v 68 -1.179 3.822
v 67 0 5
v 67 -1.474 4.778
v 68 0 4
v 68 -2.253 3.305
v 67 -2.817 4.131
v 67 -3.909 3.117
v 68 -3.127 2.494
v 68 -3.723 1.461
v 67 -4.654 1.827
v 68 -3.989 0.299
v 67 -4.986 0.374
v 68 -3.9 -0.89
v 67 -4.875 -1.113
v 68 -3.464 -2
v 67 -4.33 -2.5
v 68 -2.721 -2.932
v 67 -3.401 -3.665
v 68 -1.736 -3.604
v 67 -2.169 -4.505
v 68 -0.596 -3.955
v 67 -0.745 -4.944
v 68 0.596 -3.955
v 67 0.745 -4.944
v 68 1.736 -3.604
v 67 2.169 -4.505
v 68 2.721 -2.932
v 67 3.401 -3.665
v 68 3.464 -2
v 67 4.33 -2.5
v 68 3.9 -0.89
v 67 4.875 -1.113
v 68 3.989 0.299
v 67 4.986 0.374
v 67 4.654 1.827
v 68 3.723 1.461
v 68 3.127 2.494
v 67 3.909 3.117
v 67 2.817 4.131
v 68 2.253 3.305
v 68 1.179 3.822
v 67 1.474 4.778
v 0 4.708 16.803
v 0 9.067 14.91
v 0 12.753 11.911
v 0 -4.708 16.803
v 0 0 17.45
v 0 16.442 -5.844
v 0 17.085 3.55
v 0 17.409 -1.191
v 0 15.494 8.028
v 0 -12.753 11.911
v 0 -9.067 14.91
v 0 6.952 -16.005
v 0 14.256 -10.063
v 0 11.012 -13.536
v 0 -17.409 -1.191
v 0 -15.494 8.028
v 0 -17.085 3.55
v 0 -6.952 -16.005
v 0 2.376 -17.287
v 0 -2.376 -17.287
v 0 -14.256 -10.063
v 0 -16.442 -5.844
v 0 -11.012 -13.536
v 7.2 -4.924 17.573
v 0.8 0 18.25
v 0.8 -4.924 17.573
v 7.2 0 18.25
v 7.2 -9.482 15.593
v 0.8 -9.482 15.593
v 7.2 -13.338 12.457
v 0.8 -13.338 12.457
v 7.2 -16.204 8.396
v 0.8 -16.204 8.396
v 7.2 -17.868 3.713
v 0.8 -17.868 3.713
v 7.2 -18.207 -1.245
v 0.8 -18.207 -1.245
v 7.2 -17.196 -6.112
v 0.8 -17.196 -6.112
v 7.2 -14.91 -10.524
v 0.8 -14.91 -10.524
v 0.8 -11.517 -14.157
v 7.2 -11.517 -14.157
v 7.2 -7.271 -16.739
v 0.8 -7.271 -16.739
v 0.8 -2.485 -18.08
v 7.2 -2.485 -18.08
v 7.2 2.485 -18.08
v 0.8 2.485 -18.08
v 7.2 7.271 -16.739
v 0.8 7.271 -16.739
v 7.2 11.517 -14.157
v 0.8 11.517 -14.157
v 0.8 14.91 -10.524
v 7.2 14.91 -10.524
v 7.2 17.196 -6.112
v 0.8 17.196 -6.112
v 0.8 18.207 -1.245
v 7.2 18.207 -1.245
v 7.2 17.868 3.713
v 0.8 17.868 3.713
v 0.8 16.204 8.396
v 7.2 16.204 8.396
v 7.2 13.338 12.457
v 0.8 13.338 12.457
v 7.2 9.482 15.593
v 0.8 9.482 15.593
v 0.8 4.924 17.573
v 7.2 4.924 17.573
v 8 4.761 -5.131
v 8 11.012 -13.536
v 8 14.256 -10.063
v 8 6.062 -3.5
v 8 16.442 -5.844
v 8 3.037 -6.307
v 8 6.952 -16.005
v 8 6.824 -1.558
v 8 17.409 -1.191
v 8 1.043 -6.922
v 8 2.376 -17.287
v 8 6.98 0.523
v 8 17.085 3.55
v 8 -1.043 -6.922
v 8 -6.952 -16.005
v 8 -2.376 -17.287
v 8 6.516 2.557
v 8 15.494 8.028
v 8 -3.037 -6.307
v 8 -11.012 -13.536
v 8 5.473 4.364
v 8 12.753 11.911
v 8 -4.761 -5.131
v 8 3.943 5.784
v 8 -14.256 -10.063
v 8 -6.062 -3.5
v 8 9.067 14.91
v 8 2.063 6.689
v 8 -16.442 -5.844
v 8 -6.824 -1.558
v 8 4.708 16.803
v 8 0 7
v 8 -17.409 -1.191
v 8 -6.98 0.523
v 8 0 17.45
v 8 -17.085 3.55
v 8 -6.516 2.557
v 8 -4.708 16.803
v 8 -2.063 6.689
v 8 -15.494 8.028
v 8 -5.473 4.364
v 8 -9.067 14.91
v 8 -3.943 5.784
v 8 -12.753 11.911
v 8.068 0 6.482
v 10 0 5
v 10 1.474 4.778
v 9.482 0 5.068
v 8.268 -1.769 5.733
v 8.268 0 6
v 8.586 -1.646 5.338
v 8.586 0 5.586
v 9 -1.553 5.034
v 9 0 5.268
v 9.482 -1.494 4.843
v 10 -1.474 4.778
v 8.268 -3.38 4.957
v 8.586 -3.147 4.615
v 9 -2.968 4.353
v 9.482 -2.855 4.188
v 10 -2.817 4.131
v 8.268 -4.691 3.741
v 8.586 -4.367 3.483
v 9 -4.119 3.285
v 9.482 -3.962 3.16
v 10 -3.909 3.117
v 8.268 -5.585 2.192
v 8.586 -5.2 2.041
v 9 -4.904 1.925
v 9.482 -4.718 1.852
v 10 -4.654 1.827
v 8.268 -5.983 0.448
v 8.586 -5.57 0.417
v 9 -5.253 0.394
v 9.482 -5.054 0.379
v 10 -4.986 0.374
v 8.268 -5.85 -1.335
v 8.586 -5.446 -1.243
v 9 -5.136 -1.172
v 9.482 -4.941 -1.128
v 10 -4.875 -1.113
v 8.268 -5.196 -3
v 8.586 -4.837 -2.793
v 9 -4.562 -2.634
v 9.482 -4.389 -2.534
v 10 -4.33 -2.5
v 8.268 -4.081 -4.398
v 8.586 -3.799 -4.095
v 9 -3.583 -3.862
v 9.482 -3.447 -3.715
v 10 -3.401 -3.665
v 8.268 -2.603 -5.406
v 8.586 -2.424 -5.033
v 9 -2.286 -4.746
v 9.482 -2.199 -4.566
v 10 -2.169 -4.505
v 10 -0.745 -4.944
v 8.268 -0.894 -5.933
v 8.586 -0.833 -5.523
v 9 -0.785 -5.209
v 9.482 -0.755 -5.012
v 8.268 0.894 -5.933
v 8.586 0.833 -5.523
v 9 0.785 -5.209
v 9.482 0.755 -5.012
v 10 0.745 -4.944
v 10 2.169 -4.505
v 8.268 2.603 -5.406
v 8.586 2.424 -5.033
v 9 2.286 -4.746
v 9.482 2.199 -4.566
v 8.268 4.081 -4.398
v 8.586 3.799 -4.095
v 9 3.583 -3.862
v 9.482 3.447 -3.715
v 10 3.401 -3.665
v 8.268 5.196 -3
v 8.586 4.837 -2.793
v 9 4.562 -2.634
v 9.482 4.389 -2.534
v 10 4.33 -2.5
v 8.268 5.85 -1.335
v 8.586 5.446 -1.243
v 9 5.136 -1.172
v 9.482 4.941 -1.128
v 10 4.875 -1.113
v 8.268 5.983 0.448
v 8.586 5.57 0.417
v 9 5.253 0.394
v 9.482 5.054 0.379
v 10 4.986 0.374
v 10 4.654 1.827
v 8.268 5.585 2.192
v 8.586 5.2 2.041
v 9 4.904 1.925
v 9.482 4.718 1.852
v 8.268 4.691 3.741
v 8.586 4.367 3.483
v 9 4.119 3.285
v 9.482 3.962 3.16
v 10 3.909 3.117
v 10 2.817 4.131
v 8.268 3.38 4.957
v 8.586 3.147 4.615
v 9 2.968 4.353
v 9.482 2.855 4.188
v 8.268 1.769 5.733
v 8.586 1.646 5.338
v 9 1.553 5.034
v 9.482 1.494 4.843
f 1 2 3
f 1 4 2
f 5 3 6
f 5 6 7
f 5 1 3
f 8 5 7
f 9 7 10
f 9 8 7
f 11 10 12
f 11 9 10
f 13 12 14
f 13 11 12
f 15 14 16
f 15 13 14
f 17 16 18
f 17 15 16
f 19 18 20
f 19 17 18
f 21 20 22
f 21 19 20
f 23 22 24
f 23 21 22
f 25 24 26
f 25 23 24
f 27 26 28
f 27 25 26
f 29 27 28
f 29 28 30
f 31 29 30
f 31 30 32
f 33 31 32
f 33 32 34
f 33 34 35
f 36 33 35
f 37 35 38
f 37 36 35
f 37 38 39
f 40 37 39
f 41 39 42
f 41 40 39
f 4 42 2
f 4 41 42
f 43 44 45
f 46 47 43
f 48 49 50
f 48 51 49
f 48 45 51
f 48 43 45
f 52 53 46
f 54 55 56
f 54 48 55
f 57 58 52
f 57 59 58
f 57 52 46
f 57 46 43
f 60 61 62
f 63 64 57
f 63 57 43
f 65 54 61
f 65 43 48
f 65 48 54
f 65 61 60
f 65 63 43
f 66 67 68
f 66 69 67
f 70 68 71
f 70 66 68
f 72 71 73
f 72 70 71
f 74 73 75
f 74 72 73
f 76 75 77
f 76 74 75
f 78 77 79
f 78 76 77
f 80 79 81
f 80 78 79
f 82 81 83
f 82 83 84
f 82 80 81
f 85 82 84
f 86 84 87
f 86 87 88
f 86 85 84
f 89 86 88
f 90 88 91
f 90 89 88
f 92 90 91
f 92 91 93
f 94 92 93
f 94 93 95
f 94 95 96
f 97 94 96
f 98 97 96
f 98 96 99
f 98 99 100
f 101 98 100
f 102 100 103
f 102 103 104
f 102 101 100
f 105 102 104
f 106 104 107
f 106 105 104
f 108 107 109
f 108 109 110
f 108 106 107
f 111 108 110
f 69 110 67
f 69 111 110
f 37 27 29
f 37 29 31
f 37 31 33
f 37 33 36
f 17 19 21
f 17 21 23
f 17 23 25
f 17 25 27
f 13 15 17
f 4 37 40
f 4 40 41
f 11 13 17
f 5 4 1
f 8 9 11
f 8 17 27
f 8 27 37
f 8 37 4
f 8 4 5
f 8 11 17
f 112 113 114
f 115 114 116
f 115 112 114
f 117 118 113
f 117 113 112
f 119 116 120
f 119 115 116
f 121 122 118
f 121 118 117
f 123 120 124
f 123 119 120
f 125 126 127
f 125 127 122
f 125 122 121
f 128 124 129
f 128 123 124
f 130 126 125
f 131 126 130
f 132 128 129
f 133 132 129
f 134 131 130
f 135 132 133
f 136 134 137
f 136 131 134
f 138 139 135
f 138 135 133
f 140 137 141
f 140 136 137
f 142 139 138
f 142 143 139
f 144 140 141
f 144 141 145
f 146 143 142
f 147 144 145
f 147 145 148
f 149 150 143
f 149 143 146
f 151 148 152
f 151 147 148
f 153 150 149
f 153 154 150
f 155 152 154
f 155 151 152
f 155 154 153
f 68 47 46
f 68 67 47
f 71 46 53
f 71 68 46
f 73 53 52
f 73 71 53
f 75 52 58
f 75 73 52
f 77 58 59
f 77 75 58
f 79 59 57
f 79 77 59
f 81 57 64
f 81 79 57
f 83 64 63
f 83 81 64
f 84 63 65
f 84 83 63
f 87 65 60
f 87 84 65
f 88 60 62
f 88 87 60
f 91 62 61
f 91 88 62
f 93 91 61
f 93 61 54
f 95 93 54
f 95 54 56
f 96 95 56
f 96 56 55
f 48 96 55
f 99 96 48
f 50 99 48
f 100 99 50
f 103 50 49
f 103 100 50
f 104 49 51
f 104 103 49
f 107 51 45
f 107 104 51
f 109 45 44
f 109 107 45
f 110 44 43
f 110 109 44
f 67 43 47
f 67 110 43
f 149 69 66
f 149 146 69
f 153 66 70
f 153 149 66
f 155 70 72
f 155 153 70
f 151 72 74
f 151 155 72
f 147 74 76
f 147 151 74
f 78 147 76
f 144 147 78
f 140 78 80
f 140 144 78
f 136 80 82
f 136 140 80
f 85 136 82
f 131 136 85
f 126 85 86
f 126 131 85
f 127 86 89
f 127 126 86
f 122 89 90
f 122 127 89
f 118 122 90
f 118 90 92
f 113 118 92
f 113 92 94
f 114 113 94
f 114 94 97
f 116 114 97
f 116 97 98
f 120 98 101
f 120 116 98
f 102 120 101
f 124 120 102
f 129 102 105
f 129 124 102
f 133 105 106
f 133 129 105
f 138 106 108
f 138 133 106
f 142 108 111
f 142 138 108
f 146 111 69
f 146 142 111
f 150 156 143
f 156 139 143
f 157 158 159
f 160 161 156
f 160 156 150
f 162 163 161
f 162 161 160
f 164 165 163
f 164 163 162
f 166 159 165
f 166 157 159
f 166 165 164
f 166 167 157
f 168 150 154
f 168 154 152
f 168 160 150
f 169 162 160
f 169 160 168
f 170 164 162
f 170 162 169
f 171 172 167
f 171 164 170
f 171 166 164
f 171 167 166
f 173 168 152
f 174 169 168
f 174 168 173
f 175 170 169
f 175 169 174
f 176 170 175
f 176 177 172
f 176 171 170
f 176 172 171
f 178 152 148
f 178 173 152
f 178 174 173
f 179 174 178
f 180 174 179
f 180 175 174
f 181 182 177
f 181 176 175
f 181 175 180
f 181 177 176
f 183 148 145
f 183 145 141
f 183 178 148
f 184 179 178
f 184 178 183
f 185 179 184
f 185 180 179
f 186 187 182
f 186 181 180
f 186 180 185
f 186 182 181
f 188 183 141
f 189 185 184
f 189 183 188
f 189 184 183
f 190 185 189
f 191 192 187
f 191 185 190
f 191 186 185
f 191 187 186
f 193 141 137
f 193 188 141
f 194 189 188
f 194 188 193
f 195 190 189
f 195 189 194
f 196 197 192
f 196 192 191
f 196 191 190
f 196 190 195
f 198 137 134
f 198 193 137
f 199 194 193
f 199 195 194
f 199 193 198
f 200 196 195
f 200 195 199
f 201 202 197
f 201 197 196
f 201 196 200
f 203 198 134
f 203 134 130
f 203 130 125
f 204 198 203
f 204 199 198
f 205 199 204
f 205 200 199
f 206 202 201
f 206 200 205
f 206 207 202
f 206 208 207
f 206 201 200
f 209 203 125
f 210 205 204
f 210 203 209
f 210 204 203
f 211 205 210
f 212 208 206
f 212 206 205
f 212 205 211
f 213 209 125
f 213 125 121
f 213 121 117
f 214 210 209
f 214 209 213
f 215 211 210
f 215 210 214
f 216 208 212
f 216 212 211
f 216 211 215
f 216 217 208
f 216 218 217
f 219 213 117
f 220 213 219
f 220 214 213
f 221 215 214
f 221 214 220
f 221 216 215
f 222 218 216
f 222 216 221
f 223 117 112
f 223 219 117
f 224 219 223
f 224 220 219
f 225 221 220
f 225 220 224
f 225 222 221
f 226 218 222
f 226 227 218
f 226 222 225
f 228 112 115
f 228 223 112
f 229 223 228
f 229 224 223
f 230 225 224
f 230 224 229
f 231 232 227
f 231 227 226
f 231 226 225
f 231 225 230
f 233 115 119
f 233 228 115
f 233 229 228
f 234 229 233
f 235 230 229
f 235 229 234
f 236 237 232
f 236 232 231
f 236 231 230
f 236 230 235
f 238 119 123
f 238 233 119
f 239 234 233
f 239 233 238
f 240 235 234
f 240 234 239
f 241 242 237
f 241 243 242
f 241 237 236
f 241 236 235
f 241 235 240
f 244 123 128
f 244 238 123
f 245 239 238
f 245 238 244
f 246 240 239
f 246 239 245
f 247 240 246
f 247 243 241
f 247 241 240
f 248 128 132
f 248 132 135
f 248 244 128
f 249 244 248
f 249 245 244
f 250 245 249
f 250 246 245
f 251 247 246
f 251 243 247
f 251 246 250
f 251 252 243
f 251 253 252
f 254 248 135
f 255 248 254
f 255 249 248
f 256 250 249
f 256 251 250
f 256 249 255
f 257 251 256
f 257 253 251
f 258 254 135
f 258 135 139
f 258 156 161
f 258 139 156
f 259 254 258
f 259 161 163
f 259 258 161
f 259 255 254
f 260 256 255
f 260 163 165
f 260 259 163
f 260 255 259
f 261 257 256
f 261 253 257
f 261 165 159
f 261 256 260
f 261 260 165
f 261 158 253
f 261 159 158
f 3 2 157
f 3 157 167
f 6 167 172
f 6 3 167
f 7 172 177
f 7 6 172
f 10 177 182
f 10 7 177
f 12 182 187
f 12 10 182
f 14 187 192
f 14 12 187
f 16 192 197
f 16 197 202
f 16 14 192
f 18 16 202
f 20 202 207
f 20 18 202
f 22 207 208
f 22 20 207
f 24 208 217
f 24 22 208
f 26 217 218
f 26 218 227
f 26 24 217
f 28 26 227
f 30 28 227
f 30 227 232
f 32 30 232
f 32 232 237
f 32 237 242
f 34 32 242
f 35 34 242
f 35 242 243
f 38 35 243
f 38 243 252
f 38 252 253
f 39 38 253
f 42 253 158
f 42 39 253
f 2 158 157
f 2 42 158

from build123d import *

# Parameters (mm, degrees)
FILLET2_R     = 2
SKETCH1_R     = 0.5
NOTHING_DEPTH = 2


with BuildPart() as part:
    # BodySke → Base-Revolve (revolve)
    with BuildSketch(Plane.XY, mode=Mode.PRIVATE) as base_revolve_sk:
        Polygon((67, 5), (68, 4), (68, 0), (0, 0), (0, 17.45), (0.8, 18.25), (7.2, 18.25), (8, 17.45), (8, 5), align=None)
    revolve(base_revolve_sk.sketch.rotate(Axis((-11.400788802, 0, 0), (1, 0, 0)), 90), axis=Axis((-11.400788802, 0, 0), (1, 0, 0)))

    # Fillet2
    fillet2_edges = [part.edges().sort_by_distance(p)[0] for p in [
        (8, 0, -5),
    ]]
    fillet(fillet2_edges, radius=FILLET2_R)

    # Sketch1 → Nothing (add)
    with BuildSketch(Plane(origin=(68, 0, 0), x_dir=(0, 0, -1), z_dir=(1, 0, 0))):
        Circle(SKETCH1_R)
    extrude(amount=-NOTHING_DEPTH)


solid = part.part
